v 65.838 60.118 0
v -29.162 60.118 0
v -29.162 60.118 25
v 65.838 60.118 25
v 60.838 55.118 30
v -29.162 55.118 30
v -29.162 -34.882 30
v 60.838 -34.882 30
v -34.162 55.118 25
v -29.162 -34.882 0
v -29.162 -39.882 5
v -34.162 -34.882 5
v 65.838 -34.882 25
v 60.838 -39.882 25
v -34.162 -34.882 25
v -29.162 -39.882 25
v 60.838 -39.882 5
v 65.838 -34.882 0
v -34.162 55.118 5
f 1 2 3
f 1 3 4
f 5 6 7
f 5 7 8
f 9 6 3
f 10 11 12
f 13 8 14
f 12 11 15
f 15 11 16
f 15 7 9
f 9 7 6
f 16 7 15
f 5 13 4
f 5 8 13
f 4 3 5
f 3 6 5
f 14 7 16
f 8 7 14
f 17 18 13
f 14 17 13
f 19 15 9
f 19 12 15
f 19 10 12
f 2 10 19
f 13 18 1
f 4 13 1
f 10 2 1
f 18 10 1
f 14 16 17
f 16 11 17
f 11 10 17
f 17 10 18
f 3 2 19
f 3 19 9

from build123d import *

# Parameters (mm, degrees)
F0_W     = 100
F0_H     = 100
F1_DEPTH = 30
F4_SIZE  = 5


# Not quite as in the source:
# - the program builds the solid bodies; features that only make, move or delete a surface that nothing else refers to are left out


with BuildPart() as f1:
    # F0 (on Top) → F1 (new body)
    with BuildSketch(Plane.XY):
        with Locations((15.8379010856, 10.1181242615)):
            Rectangle(F0_W, F0_H)
    extrude(amount=F1_DEPTH)

    # F4
    f4_edges = [f1.edges().sort_by_distance(p)[0] for p in [
        (65.837901, 10.118124, 30),
        (15.837901, 60.118124, 30),
        (-34.162099, 10.118124, 30),
        (15.837901, -39.881876, 30),
        (-34.162099, -39.881876, 15),
        (65.837901, -39.881876, 15),
        (15.837901, -39.881876, 0),
        (-34.162099, 60.118124, 15),
        (-34.162099, 10.118124, 0),
    ]]
    chamfer(f4_edges, length=F4_SIZE)


solid = f1.part
